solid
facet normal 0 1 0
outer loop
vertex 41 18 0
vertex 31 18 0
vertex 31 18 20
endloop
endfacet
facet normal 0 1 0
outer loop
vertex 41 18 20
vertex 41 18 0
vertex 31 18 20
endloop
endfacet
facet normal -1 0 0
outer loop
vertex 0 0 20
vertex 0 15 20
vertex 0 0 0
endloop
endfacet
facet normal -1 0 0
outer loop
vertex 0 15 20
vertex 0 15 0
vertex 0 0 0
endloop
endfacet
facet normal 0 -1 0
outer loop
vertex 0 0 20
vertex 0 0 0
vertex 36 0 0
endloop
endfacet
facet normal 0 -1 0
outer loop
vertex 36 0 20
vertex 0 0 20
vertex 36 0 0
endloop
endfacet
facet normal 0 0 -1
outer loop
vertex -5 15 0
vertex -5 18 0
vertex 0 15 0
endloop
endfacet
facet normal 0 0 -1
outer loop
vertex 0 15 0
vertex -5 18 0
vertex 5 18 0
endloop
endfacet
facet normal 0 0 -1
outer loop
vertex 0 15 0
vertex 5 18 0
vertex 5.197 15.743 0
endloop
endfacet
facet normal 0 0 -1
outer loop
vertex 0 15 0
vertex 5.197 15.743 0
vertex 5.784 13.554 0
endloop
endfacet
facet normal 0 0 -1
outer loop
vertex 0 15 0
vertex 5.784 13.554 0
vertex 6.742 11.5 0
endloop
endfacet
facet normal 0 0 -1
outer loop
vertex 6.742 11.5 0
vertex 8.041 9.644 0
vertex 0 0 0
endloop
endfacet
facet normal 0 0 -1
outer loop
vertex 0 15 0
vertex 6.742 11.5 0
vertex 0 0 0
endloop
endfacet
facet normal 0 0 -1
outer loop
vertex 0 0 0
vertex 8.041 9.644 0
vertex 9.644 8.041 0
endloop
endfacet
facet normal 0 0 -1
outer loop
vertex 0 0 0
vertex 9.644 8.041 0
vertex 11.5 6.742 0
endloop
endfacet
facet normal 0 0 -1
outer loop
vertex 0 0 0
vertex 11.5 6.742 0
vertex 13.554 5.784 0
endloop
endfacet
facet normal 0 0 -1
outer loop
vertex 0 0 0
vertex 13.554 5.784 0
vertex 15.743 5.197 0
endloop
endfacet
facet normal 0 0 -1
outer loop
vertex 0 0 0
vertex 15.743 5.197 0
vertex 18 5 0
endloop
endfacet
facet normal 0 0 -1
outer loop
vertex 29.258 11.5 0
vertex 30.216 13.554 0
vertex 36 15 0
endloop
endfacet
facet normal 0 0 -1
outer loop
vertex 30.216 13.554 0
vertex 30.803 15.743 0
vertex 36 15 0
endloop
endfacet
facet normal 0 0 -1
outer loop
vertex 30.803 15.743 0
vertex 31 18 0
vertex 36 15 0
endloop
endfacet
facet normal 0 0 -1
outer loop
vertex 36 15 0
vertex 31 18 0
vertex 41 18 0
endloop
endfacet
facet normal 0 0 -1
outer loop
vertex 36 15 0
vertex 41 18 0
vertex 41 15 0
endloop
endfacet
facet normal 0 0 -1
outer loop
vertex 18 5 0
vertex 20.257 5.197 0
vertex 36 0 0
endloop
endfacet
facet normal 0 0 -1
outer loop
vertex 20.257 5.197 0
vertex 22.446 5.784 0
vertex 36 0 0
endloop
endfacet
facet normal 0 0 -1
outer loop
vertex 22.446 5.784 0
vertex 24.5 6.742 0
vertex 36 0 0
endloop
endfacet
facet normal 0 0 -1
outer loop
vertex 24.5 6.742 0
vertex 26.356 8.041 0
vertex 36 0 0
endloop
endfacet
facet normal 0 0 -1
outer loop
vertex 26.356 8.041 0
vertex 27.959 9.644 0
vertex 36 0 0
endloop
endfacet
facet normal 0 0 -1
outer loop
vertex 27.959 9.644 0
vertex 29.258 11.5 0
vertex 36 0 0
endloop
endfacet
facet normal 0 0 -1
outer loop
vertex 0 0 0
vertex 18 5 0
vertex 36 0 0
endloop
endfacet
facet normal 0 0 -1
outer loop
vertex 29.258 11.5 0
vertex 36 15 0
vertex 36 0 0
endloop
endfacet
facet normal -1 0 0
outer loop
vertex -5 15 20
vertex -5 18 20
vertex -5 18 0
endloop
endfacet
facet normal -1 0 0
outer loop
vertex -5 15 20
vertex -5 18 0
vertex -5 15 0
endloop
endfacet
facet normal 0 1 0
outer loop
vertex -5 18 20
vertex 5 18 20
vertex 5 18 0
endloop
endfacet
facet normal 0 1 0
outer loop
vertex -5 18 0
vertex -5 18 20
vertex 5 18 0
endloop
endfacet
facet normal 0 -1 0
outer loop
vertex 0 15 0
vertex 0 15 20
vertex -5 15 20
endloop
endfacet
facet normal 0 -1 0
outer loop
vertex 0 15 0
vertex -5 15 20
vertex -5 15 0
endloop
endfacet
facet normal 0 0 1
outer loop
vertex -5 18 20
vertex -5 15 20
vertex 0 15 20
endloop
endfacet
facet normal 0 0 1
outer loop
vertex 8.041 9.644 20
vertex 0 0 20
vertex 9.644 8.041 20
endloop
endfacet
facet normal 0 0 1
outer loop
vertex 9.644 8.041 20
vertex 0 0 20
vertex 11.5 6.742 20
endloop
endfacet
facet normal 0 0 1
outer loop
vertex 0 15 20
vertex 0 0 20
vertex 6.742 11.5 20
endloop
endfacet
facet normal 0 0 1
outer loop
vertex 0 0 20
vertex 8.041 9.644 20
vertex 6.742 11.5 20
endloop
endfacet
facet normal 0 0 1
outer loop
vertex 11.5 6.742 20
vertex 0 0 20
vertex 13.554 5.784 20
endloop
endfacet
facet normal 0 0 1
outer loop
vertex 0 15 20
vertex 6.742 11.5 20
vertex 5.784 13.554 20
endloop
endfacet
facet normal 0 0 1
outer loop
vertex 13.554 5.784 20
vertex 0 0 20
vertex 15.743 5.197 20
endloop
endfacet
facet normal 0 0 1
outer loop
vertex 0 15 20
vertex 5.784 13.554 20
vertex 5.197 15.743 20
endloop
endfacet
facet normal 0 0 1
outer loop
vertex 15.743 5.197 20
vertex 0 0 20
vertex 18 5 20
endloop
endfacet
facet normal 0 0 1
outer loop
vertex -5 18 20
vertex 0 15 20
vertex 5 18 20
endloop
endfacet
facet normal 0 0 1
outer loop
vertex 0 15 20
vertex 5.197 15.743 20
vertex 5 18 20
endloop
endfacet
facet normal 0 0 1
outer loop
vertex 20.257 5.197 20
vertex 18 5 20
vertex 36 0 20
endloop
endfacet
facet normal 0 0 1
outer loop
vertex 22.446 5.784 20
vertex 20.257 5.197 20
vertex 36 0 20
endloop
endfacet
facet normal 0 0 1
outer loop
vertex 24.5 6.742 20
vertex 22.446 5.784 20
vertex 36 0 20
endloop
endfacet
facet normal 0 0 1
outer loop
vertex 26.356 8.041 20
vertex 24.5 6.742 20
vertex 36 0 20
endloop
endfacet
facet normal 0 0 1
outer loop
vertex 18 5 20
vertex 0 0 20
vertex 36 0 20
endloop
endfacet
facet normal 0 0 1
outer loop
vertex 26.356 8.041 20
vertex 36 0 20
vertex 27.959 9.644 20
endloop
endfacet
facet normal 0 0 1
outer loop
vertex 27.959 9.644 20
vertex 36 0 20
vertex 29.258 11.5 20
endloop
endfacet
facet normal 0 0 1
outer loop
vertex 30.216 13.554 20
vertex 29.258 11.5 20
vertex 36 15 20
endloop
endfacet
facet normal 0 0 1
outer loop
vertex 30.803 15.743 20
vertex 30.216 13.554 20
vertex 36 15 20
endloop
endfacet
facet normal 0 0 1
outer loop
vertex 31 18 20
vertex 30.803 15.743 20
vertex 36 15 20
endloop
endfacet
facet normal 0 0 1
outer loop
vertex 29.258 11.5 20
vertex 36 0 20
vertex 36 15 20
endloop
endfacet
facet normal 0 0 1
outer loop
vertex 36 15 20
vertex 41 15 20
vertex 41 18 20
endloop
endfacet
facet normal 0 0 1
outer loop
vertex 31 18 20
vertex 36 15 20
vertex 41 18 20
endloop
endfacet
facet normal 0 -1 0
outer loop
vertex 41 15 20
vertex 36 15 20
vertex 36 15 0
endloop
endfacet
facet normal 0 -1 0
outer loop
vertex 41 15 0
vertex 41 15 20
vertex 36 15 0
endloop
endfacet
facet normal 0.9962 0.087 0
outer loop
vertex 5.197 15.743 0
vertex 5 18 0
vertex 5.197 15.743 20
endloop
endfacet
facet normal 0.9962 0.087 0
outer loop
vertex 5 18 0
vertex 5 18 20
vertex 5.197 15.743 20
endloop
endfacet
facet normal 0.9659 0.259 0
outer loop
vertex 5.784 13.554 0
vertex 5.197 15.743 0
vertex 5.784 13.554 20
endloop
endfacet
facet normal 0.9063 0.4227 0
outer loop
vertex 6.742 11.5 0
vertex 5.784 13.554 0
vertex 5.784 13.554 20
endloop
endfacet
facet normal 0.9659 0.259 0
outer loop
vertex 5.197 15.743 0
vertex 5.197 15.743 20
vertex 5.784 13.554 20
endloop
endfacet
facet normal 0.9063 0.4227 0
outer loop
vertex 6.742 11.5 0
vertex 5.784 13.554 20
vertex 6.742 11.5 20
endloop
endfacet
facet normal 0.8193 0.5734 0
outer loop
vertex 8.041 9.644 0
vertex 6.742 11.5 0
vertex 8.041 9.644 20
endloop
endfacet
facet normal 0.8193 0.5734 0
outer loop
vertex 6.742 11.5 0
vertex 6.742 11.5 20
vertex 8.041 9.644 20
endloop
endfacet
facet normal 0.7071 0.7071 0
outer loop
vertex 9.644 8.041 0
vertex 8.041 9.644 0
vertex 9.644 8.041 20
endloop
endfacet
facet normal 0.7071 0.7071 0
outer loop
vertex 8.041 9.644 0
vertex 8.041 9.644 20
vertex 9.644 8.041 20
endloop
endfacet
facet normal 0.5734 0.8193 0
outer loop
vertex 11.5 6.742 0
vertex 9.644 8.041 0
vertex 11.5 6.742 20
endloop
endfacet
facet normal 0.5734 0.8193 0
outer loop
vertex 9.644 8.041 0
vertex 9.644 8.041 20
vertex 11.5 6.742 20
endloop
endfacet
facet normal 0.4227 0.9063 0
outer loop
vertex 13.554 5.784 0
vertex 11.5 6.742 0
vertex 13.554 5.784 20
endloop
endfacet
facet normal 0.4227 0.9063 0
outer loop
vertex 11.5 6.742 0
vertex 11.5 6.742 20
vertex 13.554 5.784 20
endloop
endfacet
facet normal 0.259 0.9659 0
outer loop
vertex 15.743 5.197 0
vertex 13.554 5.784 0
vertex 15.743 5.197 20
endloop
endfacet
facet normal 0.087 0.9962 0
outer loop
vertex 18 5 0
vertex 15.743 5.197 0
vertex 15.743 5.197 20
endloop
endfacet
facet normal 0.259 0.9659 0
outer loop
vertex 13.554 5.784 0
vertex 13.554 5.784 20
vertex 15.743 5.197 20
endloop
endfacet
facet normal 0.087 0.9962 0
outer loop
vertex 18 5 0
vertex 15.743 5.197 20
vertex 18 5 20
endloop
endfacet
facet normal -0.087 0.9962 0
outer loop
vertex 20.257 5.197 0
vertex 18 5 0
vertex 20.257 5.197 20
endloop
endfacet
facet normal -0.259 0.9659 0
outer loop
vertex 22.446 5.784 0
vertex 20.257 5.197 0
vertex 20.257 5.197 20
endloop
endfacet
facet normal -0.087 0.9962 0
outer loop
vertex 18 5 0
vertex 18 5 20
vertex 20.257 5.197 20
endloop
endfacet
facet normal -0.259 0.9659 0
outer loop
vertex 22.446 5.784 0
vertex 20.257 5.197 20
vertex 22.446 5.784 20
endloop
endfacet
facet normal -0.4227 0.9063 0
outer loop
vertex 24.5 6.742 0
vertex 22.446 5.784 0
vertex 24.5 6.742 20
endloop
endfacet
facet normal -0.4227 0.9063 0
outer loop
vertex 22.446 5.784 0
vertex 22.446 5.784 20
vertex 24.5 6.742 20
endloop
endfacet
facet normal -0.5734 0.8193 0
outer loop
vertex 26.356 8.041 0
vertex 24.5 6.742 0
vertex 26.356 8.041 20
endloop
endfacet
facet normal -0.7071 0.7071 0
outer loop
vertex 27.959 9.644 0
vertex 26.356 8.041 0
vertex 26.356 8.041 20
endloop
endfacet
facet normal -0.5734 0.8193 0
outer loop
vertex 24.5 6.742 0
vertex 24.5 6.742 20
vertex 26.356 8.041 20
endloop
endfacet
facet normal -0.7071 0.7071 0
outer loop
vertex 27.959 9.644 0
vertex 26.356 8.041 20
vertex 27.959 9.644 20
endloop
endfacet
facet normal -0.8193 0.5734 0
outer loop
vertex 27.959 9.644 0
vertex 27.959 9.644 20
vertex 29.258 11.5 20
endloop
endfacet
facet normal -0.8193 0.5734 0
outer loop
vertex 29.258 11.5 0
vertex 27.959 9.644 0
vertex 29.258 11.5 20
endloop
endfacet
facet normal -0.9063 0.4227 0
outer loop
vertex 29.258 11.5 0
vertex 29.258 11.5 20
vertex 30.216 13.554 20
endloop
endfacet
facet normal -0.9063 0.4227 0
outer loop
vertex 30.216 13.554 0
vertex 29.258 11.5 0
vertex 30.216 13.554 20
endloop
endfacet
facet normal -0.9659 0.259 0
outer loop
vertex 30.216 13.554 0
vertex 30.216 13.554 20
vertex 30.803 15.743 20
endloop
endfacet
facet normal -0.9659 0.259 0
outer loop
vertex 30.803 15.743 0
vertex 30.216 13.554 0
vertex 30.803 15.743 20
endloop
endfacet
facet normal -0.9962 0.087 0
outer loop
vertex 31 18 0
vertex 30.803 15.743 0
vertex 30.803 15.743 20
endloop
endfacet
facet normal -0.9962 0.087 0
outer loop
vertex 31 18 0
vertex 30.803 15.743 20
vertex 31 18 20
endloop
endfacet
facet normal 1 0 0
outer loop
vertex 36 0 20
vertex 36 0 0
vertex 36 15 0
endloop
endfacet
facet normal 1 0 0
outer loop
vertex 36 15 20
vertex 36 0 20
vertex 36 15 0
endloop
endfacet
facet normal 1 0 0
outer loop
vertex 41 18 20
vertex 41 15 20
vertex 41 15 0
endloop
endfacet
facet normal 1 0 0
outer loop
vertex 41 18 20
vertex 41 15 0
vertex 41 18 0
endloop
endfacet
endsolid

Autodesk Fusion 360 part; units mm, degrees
sketch "Sketch1" plane through (0, 0, 0) normal (0, 0, 1) x (1, 0, 0)
  line L0 (0, 0) -> (36, 0)
  line L1 (36, 0) -> (36, 18)
  line L2 (36, 18) -> (0, 18)
  line L3 (0, 18) -> (0, 0)
  dimension "d1" = 36
  dimension "d2" = 18
extrude "Extrude1" add sketch "Sketch1" along normal blind 20
sketch "Sketch2" plane through (0, 0, 20) normal (0, 0, 1) x (-1, 0, 0)
  line L0 (0, -18) -> (0, 0)
  line L1 (0, 0) -> (-36, 0)
  line L2 (-36, 0) -> (-36, -18)
  line L3 (-36, -18) -> (0, -18)
  circle A0 centre (-18, -18) radius 13
  dimension "d5" = 26
extrude "Extrude2" cut sketch "Sketch2" against normal blind 20 contours L3 A0 picked at (-19.0768, -11.2377)
ref_plane "WorkPlane1" through (0, 20, 0) normal (0, 1, 0) x (0, 0, 1)
sketch "Sketch3" plane through (36, 0, 0) normal (1, 0, 0) x (0, 1, 0)
  line L0 (0, 0) -> (18, 0)
  line L1 (18, 0) -> (18, 20)
  line L2 (18, 20) -> (0, 20)
  line L3 (0, 20) -> (0, 0)
  line L4 (18, 20) -> (15, 20)
  line L5 (15, 20) -> (15, 0)
  line L6 (15, 0) -> (18, 0)
  line L7 (18, 0) -> (18, 20)
extrude "Extrude3" add sketch "Sketch3" along normal blind 5 contours L0 L1 L2 L4 L5 L6 L7
sketch "Sketch4" plane through (0, 0, 0) normal (-1, 0, 0) x (0, -1, 0)
  line L0 (-18, 0) -> (0, 0)
  line L1 (0, 0) -> (0, 20)
  line L2 (0, 20) -> (-18, 20)
  line L3 (-18, 20) -> (-18, 0)
  line L4 (-18, 20) -> (-15, 20)
  line L5 (-15, 20) -> (-15, 0)
  line L6 (-15, 0) -> (-18, 0)
  line L7 (-18, 0) -> (-18, 20)
  point P0 (-15, 0)
extrude "Extrude4" add sketch "Sketch4" along normal blind 5 contours L0 L2 L3 L4 L5 L6 L7
sketch "Sketch5" plane through (0, 15, 0) normal (0, -1, 0) x (1, 0, 0)
  line L0 (36, 20) -> (36, 0)
  line L1 (36, 0) -> (41, 0)
  line L2 (41, 0) -> (41, 20)
  line L3 (41, 20) -> (36, 20)
  line L4 (36, 10) -> (46, 10) construction
  circle A0 centre (38.5, 15) radius 1.5
  line L5 (5, 20) -> (5, 0)
  line L6 (18, 10) -> (18, 25) construction
  circle A1 centre (38.5, 5) radius 1.5
  circle A2 centre (-2.5, 15) radius 1.5
  circle A3 centre (-2.5, 5) radius 1.5
  point P0 (0, 20)
  dimension "d13" = 3
  dimension "d14" = 5
  dimension "d15" = 2.5
